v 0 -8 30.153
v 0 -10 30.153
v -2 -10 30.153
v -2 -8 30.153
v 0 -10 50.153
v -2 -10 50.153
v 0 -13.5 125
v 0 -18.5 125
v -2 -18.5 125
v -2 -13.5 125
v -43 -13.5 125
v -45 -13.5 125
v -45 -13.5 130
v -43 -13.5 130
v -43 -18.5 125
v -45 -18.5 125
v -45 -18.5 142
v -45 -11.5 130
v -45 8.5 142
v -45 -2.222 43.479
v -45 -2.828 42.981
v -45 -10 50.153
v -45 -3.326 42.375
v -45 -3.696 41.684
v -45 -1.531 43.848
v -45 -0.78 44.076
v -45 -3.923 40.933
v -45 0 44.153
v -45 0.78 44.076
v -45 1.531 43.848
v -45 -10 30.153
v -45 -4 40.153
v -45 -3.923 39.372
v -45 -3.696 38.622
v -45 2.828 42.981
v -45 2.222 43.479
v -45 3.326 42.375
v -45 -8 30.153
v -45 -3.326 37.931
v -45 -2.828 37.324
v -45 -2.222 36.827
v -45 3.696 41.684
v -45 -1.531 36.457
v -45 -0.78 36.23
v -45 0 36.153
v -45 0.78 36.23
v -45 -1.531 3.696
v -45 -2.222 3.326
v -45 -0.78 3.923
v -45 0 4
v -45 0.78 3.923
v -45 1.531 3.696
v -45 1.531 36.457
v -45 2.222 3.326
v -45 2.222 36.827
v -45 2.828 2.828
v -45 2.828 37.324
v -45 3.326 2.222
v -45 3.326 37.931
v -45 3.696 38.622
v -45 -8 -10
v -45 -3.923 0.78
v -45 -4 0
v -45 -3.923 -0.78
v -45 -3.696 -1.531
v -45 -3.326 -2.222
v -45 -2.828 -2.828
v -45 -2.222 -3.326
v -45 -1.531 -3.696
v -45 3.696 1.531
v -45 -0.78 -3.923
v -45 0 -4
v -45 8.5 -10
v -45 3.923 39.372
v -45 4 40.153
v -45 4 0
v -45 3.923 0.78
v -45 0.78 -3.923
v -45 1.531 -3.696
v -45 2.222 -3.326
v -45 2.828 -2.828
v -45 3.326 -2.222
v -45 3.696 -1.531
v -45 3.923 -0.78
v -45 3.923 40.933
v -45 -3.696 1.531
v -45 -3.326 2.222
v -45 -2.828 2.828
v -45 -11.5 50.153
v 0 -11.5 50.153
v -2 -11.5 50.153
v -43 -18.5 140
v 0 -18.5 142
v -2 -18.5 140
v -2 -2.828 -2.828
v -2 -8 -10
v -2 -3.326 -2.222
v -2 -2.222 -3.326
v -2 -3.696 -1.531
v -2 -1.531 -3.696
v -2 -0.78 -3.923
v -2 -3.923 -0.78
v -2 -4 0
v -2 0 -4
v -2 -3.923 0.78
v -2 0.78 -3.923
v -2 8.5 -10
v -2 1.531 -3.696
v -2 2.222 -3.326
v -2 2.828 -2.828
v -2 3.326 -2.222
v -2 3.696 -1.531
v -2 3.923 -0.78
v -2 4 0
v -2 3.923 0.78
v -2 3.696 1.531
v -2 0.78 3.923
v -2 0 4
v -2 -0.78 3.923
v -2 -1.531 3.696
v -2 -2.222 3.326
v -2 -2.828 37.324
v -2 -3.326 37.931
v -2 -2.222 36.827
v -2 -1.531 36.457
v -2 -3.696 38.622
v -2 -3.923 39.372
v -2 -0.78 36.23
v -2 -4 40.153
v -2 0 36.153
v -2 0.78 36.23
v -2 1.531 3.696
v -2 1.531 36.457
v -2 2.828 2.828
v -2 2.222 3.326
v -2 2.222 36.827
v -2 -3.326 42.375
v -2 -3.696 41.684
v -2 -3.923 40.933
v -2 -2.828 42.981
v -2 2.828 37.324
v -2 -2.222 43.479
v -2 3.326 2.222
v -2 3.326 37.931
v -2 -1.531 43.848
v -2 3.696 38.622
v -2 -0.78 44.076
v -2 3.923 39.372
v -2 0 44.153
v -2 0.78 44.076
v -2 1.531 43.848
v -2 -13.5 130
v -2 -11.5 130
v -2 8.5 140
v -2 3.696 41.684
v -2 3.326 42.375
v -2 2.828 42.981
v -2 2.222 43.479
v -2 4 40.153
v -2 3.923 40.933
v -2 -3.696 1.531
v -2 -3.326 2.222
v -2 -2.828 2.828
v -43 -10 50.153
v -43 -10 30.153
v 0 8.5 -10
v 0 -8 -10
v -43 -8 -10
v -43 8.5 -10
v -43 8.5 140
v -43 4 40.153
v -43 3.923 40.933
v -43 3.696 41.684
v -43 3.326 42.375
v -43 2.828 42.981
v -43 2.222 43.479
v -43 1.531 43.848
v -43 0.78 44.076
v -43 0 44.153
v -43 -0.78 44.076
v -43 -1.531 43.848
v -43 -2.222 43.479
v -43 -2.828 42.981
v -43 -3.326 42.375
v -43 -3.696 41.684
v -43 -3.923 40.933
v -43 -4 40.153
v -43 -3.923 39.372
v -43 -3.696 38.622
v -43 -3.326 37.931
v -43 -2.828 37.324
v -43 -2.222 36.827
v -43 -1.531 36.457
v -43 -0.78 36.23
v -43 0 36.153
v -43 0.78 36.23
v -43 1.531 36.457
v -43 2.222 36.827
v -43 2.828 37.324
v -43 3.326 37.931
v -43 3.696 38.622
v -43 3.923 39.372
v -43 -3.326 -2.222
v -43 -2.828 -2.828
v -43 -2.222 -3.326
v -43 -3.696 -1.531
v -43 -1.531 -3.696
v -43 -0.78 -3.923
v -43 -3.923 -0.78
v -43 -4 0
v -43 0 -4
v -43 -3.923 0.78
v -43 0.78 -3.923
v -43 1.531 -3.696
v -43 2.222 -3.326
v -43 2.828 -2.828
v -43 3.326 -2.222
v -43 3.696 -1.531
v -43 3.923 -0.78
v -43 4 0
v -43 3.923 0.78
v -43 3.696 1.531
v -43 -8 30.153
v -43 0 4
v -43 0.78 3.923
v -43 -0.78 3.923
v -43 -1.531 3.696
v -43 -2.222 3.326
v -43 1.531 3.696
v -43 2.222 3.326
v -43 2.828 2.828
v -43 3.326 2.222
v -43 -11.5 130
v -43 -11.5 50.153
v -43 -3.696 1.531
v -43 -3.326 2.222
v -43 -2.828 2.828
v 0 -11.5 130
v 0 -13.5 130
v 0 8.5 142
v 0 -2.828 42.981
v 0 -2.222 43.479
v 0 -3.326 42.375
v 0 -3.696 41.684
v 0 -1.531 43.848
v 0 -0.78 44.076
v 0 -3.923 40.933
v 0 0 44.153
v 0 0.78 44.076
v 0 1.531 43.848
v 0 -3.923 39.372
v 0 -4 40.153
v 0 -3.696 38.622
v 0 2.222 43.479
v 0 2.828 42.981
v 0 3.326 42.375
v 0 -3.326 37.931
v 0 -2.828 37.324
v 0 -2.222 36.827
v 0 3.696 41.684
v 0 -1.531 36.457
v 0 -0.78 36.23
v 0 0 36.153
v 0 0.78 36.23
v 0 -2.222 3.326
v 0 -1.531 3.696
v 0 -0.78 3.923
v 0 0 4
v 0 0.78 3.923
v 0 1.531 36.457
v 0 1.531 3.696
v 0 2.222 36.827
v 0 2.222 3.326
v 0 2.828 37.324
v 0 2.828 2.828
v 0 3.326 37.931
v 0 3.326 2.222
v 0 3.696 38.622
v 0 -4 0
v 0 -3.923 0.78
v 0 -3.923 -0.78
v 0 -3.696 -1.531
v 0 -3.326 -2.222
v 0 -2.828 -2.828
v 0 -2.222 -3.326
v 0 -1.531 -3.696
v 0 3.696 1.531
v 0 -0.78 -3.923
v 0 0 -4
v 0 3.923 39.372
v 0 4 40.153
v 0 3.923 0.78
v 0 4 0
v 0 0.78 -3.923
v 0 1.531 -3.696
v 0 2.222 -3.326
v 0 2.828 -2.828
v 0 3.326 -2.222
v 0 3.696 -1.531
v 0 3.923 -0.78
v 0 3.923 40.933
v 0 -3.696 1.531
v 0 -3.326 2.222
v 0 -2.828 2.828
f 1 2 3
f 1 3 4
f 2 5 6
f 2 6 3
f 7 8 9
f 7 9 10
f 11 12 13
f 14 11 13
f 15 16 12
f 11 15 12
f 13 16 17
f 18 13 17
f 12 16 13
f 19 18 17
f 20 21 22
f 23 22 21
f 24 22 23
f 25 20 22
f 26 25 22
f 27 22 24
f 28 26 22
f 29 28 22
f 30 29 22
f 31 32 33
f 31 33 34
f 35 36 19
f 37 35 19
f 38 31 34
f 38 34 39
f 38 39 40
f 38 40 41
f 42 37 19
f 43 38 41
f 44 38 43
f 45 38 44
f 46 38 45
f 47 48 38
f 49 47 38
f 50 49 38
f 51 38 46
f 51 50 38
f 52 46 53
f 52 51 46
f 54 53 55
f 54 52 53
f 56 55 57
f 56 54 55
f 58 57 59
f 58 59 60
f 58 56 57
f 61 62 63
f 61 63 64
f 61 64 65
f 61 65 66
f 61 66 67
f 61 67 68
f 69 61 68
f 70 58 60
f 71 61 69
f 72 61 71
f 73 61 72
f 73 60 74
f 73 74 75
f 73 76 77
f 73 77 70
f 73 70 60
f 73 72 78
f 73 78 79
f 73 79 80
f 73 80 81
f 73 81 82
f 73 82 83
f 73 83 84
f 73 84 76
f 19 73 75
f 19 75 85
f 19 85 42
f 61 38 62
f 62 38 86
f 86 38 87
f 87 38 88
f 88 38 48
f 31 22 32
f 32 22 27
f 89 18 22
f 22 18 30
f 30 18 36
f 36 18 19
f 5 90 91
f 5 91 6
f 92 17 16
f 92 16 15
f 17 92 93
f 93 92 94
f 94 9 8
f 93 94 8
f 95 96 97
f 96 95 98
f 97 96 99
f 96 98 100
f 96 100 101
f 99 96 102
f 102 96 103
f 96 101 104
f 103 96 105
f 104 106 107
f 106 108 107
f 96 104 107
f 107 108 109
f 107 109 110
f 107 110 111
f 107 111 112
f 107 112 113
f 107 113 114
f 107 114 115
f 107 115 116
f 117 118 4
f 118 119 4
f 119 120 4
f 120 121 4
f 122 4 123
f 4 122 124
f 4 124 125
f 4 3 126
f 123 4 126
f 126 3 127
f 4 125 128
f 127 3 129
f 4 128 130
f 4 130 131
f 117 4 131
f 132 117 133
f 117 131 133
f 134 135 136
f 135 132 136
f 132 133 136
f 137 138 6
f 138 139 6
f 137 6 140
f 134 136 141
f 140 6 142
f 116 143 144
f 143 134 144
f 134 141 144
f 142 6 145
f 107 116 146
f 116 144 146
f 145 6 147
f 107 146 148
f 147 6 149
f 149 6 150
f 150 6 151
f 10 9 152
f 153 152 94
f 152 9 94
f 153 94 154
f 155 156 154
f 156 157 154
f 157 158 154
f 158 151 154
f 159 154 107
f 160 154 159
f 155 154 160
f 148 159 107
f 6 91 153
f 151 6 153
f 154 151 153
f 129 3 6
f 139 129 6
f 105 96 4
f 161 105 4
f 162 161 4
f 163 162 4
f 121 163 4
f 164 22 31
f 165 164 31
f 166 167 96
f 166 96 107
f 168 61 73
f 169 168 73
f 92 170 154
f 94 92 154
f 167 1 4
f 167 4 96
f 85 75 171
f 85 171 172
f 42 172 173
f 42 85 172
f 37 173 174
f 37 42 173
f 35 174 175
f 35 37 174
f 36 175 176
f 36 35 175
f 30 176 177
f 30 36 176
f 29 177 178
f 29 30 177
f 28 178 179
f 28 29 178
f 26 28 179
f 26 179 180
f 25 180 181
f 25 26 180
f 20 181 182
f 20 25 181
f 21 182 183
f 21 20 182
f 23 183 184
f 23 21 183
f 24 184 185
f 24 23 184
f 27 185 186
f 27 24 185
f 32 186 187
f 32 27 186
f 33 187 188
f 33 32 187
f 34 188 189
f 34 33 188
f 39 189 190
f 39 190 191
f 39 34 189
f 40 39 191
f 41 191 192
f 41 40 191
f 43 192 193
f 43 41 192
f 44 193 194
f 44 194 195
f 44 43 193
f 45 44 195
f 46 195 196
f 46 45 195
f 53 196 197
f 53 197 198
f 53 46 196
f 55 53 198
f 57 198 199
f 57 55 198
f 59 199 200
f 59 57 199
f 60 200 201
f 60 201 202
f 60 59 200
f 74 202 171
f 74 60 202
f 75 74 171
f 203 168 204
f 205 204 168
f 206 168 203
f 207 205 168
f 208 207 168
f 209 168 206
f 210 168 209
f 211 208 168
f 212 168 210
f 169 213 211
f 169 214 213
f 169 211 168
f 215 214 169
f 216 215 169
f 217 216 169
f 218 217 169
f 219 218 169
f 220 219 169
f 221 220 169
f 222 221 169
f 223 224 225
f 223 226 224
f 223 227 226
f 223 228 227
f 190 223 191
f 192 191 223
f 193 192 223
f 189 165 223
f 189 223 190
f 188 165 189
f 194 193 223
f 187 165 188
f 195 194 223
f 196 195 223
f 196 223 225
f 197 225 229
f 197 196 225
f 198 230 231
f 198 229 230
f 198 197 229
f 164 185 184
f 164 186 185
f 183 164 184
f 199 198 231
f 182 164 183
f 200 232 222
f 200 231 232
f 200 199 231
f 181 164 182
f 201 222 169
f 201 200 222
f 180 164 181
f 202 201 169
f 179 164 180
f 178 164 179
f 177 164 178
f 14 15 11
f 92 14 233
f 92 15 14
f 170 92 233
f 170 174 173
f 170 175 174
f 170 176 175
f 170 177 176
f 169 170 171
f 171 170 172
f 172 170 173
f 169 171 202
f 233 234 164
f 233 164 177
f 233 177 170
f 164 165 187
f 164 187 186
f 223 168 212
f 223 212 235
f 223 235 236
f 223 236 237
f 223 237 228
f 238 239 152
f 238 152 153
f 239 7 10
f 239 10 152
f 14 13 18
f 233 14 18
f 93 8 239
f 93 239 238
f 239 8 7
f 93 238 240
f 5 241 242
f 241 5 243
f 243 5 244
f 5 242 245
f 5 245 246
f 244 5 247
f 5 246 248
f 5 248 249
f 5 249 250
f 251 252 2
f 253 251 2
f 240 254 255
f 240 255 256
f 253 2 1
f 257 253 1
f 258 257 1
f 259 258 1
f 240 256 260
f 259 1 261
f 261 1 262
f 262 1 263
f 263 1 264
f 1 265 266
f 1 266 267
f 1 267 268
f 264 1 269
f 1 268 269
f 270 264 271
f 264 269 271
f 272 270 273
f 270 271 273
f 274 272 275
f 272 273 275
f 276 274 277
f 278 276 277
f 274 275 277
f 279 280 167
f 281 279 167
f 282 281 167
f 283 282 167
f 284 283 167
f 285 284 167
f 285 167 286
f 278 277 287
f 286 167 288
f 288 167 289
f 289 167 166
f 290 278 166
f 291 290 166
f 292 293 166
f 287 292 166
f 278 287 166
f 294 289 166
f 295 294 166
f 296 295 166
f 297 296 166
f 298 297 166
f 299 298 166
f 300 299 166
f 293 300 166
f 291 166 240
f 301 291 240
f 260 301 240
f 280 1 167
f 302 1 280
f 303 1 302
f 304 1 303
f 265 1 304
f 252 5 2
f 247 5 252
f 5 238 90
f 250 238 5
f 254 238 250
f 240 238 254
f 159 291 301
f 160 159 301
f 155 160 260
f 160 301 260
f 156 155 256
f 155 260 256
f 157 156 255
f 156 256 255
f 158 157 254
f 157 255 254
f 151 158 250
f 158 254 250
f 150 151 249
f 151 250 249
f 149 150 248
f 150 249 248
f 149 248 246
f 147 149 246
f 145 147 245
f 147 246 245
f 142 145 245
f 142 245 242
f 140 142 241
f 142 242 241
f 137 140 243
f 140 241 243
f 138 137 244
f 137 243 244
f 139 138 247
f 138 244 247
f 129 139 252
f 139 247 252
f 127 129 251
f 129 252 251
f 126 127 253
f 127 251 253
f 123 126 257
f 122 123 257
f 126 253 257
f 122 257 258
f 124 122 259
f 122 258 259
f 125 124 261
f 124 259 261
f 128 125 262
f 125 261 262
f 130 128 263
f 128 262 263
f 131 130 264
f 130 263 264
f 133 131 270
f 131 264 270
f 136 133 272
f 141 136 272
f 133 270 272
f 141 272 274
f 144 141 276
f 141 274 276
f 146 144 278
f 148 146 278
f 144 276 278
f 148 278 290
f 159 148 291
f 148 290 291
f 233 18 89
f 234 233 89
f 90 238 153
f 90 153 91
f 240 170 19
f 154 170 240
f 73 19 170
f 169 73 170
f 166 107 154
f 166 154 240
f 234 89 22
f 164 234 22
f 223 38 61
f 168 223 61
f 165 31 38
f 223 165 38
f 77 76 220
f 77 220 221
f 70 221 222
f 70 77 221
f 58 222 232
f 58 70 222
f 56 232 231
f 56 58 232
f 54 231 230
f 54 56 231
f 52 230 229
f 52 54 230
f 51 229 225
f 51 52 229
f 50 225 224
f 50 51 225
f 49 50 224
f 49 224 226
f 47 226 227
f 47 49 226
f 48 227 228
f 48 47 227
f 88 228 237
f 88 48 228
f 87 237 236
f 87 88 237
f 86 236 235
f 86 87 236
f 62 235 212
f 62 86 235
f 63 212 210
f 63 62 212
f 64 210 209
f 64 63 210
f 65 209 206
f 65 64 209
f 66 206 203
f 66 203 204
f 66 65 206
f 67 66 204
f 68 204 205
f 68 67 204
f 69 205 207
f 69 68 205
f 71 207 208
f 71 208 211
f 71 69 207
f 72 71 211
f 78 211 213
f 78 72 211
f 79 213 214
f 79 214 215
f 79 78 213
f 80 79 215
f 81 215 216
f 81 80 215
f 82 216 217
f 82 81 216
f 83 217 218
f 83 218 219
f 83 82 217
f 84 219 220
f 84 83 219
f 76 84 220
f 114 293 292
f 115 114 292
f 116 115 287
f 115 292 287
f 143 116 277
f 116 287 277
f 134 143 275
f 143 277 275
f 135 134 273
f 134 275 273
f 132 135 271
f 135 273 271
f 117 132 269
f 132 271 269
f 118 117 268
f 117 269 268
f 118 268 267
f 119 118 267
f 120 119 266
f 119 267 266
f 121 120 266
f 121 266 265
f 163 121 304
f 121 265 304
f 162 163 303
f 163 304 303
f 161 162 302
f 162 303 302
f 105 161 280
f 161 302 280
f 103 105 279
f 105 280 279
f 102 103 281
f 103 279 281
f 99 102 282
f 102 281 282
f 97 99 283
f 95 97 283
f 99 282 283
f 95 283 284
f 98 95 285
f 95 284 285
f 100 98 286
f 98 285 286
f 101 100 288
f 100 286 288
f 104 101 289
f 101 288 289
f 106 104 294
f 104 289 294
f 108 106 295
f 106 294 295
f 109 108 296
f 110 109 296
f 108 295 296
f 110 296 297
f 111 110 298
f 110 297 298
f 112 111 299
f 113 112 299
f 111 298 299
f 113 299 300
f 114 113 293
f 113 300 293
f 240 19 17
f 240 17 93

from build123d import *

# Parameters (mm, degrees)
SKETCH1_R           = 4
BOSS_EXTRUDE1_DEPTH = 2
SKETCH2_W           = 45
SKETCH2_H           = 27
BOSS_EXTRUDE2_DEPTH = 2


with BuildPart() as part:
    # Sketch1 → Boss-Extrude1 (new body)
    with BuildSketch(Plane.YZ):
        Polygon((8.5, -10), (8.5, 140), (-18.5, 140), (-18.5, 125), (-13.5, 125), (-13.5, 130), (-11.5, 130), (-11.5, 50.152793502), (-10, 50.152793502), (-10, 30.152793502), (-8, 30.152793502), (-8, -10), align=None)
        Circle(SKETCH1_R, mode=Mode.SUBTRACT)
        with Locations((0, 40.152793502)):
            Circle(SKETCH1_R, mode=Mode.SUBTRACT)
    extrude(amount=-BOSS_EXTRUDE1_DEPTH)


with BuildPart() as body_2:
    # Mirror2: mirrored copy
    add(part.part.mirror(Plane.ZY.offset(22.5)))


with BuildPart() as part_1:
    add(part.part)

    add(body_2.part)  # Boss-Extrude2 merges body 2
    # Sketch2 → Boss-Extrude2 (add)
    with BuildSketch(Plane.XY.offset(140)):
        with Locations((-22.5, -5)):
            Rectangle(SKETCH2_W, SKETCH2_H)
    extrude(amount=BOSS_EXTRUDE2_DEPTH)


solid = part_1.part
